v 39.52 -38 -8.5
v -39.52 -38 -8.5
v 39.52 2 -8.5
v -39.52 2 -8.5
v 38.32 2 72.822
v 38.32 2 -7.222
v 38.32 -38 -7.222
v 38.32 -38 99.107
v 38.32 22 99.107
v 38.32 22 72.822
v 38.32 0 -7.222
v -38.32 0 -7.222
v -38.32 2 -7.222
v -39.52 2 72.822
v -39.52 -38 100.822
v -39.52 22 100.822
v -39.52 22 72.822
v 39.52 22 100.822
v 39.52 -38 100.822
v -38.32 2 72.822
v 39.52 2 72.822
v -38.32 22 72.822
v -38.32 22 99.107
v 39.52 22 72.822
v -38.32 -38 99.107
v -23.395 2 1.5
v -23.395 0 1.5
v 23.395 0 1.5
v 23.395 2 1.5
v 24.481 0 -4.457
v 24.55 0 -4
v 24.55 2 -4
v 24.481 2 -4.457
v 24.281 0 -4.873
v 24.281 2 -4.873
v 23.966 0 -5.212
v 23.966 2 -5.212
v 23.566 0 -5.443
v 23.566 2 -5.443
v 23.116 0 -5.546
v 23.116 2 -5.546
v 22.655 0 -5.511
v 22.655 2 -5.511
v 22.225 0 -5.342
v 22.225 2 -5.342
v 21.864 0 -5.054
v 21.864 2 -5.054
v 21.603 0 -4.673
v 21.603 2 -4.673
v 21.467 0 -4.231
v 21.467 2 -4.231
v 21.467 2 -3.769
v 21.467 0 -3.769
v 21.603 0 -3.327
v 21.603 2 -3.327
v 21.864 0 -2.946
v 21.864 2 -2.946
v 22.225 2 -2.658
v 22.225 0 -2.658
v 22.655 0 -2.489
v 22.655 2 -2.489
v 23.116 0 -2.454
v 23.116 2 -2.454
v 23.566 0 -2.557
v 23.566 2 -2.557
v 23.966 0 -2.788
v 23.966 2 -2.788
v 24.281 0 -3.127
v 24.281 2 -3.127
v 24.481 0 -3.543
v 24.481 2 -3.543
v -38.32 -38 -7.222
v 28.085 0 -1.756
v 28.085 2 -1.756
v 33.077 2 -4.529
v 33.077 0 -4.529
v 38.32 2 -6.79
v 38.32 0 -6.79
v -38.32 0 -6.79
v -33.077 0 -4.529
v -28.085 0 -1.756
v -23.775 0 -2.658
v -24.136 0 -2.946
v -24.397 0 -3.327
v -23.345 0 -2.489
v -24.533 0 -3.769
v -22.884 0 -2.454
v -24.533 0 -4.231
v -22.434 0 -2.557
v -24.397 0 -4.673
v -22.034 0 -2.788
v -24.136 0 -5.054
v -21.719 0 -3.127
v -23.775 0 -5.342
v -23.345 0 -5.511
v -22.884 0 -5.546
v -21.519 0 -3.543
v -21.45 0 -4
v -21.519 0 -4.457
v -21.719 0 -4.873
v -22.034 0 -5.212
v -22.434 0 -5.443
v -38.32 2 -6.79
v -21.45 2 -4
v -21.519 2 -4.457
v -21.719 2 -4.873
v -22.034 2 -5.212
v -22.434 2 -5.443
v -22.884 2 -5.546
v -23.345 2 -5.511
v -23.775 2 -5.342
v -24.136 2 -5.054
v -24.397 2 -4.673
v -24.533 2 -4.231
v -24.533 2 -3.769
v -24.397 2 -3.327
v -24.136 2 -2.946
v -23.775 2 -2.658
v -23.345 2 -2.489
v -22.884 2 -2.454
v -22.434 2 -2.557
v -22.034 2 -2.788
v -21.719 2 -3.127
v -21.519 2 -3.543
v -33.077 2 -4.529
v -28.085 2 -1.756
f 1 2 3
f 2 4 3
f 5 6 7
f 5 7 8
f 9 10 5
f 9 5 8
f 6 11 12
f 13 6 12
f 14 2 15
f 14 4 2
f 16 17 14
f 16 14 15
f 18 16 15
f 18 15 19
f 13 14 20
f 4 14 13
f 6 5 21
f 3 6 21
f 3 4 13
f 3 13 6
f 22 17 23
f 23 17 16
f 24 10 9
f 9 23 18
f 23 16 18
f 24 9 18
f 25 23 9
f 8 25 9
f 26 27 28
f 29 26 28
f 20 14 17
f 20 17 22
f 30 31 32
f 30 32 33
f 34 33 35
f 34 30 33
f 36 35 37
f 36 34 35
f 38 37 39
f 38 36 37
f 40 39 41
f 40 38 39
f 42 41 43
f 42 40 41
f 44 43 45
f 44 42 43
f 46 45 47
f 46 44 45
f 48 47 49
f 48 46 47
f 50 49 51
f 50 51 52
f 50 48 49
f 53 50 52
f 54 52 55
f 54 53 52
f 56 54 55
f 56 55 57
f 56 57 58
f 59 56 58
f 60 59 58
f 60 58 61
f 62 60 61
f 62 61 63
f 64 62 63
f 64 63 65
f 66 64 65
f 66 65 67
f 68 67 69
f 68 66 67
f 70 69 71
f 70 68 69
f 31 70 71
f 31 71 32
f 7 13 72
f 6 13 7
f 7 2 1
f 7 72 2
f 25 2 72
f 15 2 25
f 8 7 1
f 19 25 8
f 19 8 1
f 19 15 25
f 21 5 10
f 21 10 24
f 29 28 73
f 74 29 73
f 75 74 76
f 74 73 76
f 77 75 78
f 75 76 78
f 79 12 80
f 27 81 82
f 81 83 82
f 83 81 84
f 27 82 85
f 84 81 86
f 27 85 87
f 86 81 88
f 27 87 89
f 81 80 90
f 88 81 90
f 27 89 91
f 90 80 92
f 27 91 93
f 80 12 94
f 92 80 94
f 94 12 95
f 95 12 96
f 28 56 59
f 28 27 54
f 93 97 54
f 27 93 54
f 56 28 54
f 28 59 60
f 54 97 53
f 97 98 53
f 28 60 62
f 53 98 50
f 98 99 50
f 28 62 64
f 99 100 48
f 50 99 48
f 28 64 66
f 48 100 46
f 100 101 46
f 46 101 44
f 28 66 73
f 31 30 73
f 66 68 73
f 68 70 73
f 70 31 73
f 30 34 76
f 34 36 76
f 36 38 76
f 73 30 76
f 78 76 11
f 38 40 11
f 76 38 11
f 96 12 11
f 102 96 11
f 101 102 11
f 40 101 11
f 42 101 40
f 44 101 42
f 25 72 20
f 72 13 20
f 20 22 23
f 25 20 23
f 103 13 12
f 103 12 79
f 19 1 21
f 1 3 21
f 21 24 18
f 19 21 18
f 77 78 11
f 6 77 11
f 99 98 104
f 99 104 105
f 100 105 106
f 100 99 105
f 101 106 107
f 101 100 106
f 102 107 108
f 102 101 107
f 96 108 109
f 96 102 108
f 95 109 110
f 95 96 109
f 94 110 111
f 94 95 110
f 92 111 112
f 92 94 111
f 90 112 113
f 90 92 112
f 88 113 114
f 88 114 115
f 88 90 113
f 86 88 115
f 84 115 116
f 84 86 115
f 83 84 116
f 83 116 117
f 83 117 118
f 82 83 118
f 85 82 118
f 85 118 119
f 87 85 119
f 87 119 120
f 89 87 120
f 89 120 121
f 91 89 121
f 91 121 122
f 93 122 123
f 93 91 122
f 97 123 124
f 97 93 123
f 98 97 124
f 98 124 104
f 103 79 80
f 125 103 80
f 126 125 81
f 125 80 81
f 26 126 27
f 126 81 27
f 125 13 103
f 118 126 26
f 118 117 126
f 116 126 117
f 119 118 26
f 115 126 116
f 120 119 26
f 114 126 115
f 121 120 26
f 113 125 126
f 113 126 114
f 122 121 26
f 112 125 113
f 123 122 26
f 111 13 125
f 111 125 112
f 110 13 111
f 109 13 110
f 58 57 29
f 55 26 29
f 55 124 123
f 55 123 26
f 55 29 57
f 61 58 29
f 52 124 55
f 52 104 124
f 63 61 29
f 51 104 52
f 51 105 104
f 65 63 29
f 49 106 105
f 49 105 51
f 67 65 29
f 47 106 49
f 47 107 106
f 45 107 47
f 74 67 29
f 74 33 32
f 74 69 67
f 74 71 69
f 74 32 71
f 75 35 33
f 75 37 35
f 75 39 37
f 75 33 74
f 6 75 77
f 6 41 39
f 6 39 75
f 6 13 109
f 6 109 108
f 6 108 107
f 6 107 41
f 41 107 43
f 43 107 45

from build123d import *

# Parameters (mm, degrees)
SKETCH1_R           = 1.55
BOSS_EXTRUDE1_DEPTH = 2
BOSS_EXTRUDE2_START = 2
SKETCH1_5_W         = 10.82
SKETCH1_5_H         = 1.277782348
SKETCH1_5_W_2       = 55
SKETCH1_5_W_3       = 1.2
BOSS_EXTRUDE2_DEPTH = 10
BOSS_EXTRUDE3_START = -30
BOSS_EXTRUDE3_DEPTH = 20
SKETCH4_W           = 79.04
SKETCH4_H           = 109.322217652
SKETCH4_W_2         = 76.64
SKETCH4_H_2         = 106.329004974
BOSS_EXTRUDE4_DEPTH = 30


with BuildPart() as part:
    # Sketch1 → Boss-Extrude1 (new body)
    with BuildSketch(Plane(origin=(0, 0, 0), x_dir=(1, 0, 0), z_dir=(0, 1, 0))):
        with BuildLine():
            ThreePointArc((-38.32, 6.78955122), (-30.546525972, 3.20474118), (-23.39508053, -1.5))
            Line((-23.39508053, -1.5), (23.39508053, -1.5))
            ThreePointArc((23.39508053, -1.5), (30.546525972, 3.20474118), (38.32, 6.78955122))
            Line((38.32, 6.78955122), (38.32, 7.222217652))
            Line((38.32, 7.222217652), (-38.32, 7.222217652))
            Line((-38.32, 7.222217652), (-38.32, 6.78955122))
        make_face()
        with Locations((23, 4)):
            Circle(SKETCH1_R, mode=Mode.SUBTRACT)
        with Locations((-23, 4)):
            Circle(SKETCH1_R, mode=Mode.SUBTRACT)
    extrude(amount=BOSS_EXTRUDE1_DEPTH)


with BuildPart() as body_2:
    # Sketch1<5> → Boss-Extrude2 (new body)
    with BuildSketch(Plane(origin=(0, 0, 0), x_dir=(1, 0, 0), z_dir=(0, 1, 0)).offset(BOSS_EXTRUDE2_START)):
        with BuildLine():
            Line((35.171781926, -99.106787322), (-35.171781926, -99.106787322))
            ThreePointArc((-35.171781926, -99.106787322), (-37.328360588, -100.008937922), (-39.52, -100.822217652))
            Line((-39.52, -100.822217652), (39.52, -100.822217652))
            ThreePointArc((39.52, -100.822217652), (37.328360588, -100.008937922), (35.171781926, -99.106787322))
        make_face()
        with BuildLine():
            Line((-38.32, -99.106787322), (-38.32, 5.506787322))
            Line((-38.32, 5.506787322), (-38.32, 6.78955122))
            ThreePointArc((-38.32, 6.78955122), (-38.91879385, 7.009229691), (-39.52, 7.222217652))
            Line((-39.52, 7.222217652), (-39.52, -100.822217652))
            ThreePointArc((-39.52, -100.822217652), (-37.328360588, -100.008937922), (-35.171781926, -99.106787322))
            Line((-35.171781926, -99.106787322), (-38.32, -99.106787322))
        make_face()
        with BuildLine():
            Line((38.32, -99.106787322), (35.171781926, -99.106787322))
            ThreePointArc((35.171781926, -99.106787322), (37.328360588, -100.008937922), (39.52, -100.822217652))
            Line((39.52, -100.822217652), (39.52, 5.506787322))
            Line((39.52, 5.506787322), (38.32, 5.506787322))
            Line((38.32, 5.506787322), (38.32, -99.106787322))
        make_face()
        with Locations((-32.91, 7.861108826)):
            Rectangle(SKETCH1_5_W, SKETCH1_5_H)
        with Locations((0, 7.861108826)):
            Rectangle(SKETCH1_5_W_2, SKETCH1_5_H)
        with Locations((-38.92, 7.861108826)):
            Rectangle(SKETCH1_5_W_3, SKETCH1_5_H)
        with Locations((32.91, 7.861108826)):
            Rectangle(SKETCH1_5_W, SKETCH1_5_H)
        with Locations((38.92, 7.861108826)):
            Rectangle(SKETCH1_5_W_3, SKETCH1_5_H)
        with BuildLine():
            ThreePointArc((39.52, 7.222217652), (38.91879385, 7.009229691), (38.32, 6.78955122))
            Line((38.32, 6.78955122), (38.32, 5.506787322))
            Line((38.32, 5.506787322), (39.52, 5.506787322))
            Line((39.52, 5.506787322), (39.52, 7.222217652))
        make_face()
        with BuildLine():
            Line((39.52, 7.222217652), (38.32, 7.222217652))
            Line((38.32, 7.222217652), (38.32, 6.78955122))
            ThreePointArc((38.32, 6.78955122), (38.91879385, 7.009229691), (39.52, 7.222217652))
        make_face()
        with BuildLine():
            ThreePointArc((-39.52, 7.222217652), (-38.91879385, 7.009229691), (-38.32, 6.78955122))
            Line((-38.32, 6.78955122), (-38.32, 7.222217652))
            Line((-38.32, 7.222217652), (-39.52, 7.222217652))
        make_face()
    extrude(amount=-BOSS_EXTRUDE2_DEPTH)

    # Sketch3 → Boss-Extrude3 (add)
    with BuildSketch(Plane.XZ.offset(8).offset(BOSS_EXTRUDE3_START)):
        Polygon((-39.52, 100.822217652), (-39.52, 72.822217652), (-38.32, 72.822217652), (-38.32, 99.106787322), (38.32, 99.106787322), (38.32, 72.822217652), (39.52, 72.822217652), (39.52, 100.822217652), align=None)
    extrude(amount=BOSS_EXTRUDE3_DEPTH)

    # Sketch4 → Boss-Extrude4 (add)
    with BuildSketch(Plane.XZ.offset(8)):
        with Locations((0, 46.161108826)):
            Rectangle(SKETCH4_W, SKETCH4_H)
        with Locations((0, 45.942284835)):
            Rectangle(SKETCH4_W_2, SKETCH4_H_2, mode=Mode.SUBTRACT)
    extrude(amount=BOSS_EXTRUDE4_DEPTH)


solid = Compound([part.part, body_2.part])
